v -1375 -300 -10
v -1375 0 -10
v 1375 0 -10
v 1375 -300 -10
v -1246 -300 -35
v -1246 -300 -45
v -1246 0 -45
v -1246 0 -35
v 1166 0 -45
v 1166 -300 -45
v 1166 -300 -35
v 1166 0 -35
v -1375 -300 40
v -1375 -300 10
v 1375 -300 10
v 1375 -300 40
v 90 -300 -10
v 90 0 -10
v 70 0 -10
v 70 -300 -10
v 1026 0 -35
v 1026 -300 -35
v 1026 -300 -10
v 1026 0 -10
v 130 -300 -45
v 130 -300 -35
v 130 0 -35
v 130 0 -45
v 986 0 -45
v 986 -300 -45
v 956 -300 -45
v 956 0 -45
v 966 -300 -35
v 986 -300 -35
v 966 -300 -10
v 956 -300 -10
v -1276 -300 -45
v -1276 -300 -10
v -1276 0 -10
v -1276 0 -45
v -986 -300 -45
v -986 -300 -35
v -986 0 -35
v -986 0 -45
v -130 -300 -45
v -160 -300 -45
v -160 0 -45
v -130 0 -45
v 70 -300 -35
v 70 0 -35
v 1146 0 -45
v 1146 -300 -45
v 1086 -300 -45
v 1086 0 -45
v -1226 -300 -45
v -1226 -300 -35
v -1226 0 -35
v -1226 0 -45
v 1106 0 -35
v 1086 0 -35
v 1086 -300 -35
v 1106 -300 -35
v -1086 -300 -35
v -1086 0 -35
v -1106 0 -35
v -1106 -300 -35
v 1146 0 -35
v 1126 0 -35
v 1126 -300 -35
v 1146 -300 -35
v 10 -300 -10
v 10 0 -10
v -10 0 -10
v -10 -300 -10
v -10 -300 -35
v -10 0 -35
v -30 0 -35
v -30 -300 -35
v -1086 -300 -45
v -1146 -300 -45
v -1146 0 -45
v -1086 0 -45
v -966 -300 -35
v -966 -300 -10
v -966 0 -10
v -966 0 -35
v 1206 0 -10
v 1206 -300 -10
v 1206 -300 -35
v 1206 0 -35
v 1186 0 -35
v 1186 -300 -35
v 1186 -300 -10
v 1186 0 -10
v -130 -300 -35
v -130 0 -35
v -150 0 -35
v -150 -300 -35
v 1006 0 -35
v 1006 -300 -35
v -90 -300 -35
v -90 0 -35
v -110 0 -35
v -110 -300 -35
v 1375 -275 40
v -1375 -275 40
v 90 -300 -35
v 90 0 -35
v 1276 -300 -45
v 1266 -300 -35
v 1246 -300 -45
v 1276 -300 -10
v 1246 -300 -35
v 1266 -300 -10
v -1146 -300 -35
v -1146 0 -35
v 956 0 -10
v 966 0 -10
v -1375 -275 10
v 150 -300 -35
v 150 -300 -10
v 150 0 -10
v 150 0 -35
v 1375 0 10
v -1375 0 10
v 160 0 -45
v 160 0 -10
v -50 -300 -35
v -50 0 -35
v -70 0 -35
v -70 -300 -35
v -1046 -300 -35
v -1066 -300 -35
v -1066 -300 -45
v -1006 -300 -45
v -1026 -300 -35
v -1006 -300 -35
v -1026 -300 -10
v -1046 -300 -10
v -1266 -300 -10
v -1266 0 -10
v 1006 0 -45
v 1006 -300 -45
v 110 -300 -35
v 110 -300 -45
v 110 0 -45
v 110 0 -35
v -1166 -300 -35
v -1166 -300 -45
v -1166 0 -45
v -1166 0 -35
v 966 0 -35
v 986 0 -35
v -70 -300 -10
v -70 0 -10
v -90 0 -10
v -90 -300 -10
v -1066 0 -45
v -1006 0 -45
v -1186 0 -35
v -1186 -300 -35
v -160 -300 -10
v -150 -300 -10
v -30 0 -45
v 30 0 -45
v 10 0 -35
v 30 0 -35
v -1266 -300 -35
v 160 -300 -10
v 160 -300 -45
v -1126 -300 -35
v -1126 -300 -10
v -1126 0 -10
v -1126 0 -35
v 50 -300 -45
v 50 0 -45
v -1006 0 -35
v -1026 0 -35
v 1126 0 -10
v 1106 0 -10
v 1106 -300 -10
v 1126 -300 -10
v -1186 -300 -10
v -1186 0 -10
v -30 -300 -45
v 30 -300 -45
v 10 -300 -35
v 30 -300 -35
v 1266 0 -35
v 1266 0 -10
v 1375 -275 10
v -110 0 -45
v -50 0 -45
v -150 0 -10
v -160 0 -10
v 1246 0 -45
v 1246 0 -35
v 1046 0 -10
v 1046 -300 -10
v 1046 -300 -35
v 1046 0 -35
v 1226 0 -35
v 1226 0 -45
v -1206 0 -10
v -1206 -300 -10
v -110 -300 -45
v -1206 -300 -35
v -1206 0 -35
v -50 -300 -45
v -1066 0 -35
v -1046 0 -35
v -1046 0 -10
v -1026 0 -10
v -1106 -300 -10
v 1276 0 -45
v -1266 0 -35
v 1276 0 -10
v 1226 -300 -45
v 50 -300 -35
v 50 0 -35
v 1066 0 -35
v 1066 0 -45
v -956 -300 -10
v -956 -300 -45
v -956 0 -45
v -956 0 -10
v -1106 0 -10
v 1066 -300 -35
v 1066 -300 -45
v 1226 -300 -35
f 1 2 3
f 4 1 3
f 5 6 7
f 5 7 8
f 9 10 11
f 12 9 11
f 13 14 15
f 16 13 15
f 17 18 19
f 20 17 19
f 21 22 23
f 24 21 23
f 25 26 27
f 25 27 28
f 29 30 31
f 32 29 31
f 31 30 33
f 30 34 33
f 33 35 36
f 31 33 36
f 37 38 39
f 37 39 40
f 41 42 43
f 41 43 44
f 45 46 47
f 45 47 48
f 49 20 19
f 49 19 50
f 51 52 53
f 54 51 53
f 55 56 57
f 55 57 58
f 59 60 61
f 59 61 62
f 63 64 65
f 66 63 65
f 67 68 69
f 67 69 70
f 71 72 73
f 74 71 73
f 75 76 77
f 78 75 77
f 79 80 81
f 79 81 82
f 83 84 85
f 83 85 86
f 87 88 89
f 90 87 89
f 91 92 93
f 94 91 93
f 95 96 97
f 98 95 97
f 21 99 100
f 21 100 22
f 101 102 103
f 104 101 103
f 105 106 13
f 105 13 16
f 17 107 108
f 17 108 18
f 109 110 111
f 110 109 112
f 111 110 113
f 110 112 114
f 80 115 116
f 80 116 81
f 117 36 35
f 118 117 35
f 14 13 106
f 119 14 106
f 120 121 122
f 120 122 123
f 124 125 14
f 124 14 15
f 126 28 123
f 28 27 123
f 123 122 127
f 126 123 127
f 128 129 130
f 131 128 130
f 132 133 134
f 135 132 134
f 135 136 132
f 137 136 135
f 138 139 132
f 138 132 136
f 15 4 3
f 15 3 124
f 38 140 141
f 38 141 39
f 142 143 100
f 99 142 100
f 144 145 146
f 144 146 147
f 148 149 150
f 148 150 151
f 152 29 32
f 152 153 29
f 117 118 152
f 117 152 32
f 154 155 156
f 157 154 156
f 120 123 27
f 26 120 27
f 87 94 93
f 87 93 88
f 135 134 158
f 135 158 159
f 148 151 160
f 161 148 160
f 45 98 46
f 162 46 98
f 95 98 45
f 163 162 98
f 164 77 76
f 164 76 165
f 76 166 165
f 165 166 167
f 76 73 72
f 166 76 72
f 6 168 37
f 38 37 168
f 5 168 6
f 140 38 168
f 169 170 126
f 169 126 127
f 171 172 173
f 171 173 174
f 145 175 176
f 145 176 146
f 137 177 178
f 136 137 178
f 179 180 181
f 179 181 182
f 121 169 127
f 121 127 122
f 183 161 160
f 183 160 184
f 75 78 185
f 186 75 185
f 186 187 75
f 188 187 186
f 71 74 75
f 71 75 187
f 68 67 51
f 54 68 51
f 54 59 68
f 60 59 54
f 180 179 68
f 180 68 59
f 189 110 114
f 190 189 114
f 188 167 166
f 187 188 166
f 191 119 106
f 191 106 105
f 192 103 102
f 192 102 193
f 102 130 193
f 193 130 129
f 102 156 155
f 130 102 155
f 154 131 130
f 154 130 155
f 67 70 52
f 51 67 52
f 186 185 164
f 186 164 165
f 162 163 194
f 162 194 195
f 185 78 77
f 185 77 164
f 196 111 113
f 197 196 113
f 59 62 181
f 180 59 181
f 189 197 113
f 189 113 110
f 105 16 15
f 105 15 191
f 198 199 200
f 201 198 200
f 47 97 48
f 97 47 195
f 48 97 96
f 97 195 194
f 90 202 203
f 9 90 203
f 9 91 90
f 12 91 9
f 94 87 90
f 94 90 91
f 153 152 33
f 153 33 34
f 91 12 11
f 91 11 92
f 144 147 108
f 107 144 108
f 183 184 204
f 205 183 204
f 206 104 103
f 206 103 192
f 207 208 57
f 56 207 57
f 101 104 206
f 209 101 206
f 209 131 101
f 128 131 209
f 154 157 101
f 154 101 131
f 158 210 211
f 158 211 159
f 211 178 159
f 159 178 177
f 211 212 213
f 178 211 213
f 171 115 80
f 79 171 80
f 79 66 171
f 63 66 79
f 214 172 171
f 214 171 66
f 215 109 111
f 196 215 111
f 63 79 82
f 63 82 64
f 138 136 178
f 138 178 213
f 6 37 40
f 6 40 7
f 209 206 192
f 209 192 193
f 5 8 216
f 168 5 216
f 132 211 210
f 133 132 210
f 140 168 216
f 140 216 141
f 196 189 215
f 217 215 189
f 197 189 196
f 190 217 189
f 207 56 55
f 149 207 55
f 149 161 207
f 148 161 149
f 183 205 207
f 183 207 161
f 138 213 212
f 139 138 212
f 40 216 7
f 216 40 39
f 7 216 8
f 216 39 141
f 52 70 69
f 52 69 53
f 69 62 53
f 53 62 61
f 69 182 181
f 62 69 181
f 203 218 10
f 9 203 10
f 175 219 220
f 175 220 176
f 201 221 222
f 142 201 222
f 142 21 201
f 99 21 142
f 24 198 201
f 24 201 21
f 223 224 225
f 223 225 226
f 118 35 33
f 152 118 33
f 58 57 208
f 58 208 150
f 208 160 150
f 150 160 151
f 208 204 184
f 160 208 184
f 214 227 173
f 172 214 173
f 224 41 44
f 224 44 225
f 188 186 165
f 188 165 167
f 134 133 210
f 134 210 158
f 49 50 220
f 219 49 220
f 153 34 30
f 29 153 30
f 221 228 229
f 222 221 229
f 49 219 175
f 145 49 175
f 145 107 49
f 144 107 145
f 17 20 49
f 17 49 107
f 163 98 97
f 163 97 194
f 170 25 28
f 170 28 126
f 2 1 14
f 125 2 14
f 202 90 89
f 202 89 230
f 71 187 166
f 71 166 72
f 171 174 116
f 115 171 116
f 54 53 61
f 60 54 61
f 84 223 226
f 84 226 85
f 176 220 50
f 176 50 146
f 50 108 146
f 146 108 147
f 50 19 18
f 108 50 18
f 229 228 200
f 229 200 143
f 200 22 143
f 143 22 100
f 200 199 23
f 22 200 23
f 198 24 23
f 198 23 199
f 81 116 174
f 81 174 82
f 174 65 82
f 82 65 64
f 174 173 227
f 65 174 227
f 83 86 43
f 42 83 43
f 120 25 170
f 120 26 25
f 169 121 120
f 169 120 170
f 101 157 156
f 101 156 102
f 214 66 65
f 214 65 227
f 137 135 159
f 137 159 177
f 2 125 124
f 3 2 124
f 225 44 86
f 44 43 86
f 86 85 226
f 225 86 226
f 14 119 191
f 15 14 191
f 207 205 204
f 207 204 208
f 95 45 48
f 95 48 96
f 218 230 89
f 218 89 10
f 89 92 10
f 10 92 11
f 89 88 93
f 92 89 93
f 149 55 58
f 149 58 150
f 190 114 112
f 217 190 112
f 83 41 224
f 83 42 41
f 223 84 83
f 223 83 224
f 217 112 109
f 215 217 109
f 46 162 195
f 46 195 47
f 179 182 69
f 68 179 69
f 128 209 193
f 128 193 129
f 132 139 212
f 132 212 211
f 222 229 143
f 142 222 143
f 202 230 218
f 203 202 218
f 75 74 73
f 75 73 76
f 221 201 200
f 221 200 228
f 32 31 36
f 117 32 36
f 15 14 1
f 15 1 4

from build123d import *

# Parameters (mm, degrees)
F0_W     = 2750
F0_H     = 20
F1_DEPTH = 300
F2_W     = 2750
F2_H     = 25
F3_DEPTH = 30
F5_DEPTH = 300


with BuildPart() as f1:
    # F0 (on Front) → F1 (new body)
    with BuildSketch(Plane.XZ):
        Rectangle(F0_W, F0_H)
    extrude(amount=F1_DEPTH)


with BuildPart() as f3:
    # F2 (on face) → F3 (new body)
    with BuildSketch(Plane.XY.offset(10)):
        with Locations((0, -287.5)):
            Rectangle(F2_W, F2_H)
    extrude(amount=F3_DEPTH)


with BuildPart() as f5:
    # F4 (on face) → F5 (new body)
    with BuildSketch(Plane.XZ.offset(300)):
        Polygon((10, -10), (0, -10), (0, -45), (30, -45), (30, -35), (10, -35), align=None)
        Polygon((0, -45), (0, -10), (-10, -10), (-10, -35), (-30, -35), (-30, -45), align=None)
        Polygon((50, -45), (80, -45), (80, -10), (70, -10), (70, -35), (50, -35), align=None)
        Polygon((80, -10), (80, -45), (110, -45), (110, -35), (90, -35), (90, -10), align=None)
        Polygon((-70, -10), (-80, -10), (-80, -45), (-50, -45), (-50, -35), (-70, -35), align=None)
        Polygon((-80, -45), (-80, -10), (-90, -10), (-90, -35), (-110, -35), (-110, -45), align=None)
        Polygon((130, -45), (160, -45), (160, -10), (150, -10), (150, -35), (130, -35), align=None)
        Polygon((-150, -35), (-150, -10), (-160, -10), (-160, -45), (-130, -45), (-130, -35), align=None)
    extrude(amount=-F5_DEPTH)


with BuildPart() as f7_1:
    # F7: instance of F5
    add(f5.part.mirror(Plane(origin=(558, -150, 0), x_dir=(0, 1, 0), z_dir=(1, 0, 0))))


with BuildPart() as f8_1:
    # F8: instance of F7_1
    add(f7_1.part.mirror(Plane.YZ))


solid = Compound([f1.part, f3.part, f5.part, f7_1.part, f8_1.part])
